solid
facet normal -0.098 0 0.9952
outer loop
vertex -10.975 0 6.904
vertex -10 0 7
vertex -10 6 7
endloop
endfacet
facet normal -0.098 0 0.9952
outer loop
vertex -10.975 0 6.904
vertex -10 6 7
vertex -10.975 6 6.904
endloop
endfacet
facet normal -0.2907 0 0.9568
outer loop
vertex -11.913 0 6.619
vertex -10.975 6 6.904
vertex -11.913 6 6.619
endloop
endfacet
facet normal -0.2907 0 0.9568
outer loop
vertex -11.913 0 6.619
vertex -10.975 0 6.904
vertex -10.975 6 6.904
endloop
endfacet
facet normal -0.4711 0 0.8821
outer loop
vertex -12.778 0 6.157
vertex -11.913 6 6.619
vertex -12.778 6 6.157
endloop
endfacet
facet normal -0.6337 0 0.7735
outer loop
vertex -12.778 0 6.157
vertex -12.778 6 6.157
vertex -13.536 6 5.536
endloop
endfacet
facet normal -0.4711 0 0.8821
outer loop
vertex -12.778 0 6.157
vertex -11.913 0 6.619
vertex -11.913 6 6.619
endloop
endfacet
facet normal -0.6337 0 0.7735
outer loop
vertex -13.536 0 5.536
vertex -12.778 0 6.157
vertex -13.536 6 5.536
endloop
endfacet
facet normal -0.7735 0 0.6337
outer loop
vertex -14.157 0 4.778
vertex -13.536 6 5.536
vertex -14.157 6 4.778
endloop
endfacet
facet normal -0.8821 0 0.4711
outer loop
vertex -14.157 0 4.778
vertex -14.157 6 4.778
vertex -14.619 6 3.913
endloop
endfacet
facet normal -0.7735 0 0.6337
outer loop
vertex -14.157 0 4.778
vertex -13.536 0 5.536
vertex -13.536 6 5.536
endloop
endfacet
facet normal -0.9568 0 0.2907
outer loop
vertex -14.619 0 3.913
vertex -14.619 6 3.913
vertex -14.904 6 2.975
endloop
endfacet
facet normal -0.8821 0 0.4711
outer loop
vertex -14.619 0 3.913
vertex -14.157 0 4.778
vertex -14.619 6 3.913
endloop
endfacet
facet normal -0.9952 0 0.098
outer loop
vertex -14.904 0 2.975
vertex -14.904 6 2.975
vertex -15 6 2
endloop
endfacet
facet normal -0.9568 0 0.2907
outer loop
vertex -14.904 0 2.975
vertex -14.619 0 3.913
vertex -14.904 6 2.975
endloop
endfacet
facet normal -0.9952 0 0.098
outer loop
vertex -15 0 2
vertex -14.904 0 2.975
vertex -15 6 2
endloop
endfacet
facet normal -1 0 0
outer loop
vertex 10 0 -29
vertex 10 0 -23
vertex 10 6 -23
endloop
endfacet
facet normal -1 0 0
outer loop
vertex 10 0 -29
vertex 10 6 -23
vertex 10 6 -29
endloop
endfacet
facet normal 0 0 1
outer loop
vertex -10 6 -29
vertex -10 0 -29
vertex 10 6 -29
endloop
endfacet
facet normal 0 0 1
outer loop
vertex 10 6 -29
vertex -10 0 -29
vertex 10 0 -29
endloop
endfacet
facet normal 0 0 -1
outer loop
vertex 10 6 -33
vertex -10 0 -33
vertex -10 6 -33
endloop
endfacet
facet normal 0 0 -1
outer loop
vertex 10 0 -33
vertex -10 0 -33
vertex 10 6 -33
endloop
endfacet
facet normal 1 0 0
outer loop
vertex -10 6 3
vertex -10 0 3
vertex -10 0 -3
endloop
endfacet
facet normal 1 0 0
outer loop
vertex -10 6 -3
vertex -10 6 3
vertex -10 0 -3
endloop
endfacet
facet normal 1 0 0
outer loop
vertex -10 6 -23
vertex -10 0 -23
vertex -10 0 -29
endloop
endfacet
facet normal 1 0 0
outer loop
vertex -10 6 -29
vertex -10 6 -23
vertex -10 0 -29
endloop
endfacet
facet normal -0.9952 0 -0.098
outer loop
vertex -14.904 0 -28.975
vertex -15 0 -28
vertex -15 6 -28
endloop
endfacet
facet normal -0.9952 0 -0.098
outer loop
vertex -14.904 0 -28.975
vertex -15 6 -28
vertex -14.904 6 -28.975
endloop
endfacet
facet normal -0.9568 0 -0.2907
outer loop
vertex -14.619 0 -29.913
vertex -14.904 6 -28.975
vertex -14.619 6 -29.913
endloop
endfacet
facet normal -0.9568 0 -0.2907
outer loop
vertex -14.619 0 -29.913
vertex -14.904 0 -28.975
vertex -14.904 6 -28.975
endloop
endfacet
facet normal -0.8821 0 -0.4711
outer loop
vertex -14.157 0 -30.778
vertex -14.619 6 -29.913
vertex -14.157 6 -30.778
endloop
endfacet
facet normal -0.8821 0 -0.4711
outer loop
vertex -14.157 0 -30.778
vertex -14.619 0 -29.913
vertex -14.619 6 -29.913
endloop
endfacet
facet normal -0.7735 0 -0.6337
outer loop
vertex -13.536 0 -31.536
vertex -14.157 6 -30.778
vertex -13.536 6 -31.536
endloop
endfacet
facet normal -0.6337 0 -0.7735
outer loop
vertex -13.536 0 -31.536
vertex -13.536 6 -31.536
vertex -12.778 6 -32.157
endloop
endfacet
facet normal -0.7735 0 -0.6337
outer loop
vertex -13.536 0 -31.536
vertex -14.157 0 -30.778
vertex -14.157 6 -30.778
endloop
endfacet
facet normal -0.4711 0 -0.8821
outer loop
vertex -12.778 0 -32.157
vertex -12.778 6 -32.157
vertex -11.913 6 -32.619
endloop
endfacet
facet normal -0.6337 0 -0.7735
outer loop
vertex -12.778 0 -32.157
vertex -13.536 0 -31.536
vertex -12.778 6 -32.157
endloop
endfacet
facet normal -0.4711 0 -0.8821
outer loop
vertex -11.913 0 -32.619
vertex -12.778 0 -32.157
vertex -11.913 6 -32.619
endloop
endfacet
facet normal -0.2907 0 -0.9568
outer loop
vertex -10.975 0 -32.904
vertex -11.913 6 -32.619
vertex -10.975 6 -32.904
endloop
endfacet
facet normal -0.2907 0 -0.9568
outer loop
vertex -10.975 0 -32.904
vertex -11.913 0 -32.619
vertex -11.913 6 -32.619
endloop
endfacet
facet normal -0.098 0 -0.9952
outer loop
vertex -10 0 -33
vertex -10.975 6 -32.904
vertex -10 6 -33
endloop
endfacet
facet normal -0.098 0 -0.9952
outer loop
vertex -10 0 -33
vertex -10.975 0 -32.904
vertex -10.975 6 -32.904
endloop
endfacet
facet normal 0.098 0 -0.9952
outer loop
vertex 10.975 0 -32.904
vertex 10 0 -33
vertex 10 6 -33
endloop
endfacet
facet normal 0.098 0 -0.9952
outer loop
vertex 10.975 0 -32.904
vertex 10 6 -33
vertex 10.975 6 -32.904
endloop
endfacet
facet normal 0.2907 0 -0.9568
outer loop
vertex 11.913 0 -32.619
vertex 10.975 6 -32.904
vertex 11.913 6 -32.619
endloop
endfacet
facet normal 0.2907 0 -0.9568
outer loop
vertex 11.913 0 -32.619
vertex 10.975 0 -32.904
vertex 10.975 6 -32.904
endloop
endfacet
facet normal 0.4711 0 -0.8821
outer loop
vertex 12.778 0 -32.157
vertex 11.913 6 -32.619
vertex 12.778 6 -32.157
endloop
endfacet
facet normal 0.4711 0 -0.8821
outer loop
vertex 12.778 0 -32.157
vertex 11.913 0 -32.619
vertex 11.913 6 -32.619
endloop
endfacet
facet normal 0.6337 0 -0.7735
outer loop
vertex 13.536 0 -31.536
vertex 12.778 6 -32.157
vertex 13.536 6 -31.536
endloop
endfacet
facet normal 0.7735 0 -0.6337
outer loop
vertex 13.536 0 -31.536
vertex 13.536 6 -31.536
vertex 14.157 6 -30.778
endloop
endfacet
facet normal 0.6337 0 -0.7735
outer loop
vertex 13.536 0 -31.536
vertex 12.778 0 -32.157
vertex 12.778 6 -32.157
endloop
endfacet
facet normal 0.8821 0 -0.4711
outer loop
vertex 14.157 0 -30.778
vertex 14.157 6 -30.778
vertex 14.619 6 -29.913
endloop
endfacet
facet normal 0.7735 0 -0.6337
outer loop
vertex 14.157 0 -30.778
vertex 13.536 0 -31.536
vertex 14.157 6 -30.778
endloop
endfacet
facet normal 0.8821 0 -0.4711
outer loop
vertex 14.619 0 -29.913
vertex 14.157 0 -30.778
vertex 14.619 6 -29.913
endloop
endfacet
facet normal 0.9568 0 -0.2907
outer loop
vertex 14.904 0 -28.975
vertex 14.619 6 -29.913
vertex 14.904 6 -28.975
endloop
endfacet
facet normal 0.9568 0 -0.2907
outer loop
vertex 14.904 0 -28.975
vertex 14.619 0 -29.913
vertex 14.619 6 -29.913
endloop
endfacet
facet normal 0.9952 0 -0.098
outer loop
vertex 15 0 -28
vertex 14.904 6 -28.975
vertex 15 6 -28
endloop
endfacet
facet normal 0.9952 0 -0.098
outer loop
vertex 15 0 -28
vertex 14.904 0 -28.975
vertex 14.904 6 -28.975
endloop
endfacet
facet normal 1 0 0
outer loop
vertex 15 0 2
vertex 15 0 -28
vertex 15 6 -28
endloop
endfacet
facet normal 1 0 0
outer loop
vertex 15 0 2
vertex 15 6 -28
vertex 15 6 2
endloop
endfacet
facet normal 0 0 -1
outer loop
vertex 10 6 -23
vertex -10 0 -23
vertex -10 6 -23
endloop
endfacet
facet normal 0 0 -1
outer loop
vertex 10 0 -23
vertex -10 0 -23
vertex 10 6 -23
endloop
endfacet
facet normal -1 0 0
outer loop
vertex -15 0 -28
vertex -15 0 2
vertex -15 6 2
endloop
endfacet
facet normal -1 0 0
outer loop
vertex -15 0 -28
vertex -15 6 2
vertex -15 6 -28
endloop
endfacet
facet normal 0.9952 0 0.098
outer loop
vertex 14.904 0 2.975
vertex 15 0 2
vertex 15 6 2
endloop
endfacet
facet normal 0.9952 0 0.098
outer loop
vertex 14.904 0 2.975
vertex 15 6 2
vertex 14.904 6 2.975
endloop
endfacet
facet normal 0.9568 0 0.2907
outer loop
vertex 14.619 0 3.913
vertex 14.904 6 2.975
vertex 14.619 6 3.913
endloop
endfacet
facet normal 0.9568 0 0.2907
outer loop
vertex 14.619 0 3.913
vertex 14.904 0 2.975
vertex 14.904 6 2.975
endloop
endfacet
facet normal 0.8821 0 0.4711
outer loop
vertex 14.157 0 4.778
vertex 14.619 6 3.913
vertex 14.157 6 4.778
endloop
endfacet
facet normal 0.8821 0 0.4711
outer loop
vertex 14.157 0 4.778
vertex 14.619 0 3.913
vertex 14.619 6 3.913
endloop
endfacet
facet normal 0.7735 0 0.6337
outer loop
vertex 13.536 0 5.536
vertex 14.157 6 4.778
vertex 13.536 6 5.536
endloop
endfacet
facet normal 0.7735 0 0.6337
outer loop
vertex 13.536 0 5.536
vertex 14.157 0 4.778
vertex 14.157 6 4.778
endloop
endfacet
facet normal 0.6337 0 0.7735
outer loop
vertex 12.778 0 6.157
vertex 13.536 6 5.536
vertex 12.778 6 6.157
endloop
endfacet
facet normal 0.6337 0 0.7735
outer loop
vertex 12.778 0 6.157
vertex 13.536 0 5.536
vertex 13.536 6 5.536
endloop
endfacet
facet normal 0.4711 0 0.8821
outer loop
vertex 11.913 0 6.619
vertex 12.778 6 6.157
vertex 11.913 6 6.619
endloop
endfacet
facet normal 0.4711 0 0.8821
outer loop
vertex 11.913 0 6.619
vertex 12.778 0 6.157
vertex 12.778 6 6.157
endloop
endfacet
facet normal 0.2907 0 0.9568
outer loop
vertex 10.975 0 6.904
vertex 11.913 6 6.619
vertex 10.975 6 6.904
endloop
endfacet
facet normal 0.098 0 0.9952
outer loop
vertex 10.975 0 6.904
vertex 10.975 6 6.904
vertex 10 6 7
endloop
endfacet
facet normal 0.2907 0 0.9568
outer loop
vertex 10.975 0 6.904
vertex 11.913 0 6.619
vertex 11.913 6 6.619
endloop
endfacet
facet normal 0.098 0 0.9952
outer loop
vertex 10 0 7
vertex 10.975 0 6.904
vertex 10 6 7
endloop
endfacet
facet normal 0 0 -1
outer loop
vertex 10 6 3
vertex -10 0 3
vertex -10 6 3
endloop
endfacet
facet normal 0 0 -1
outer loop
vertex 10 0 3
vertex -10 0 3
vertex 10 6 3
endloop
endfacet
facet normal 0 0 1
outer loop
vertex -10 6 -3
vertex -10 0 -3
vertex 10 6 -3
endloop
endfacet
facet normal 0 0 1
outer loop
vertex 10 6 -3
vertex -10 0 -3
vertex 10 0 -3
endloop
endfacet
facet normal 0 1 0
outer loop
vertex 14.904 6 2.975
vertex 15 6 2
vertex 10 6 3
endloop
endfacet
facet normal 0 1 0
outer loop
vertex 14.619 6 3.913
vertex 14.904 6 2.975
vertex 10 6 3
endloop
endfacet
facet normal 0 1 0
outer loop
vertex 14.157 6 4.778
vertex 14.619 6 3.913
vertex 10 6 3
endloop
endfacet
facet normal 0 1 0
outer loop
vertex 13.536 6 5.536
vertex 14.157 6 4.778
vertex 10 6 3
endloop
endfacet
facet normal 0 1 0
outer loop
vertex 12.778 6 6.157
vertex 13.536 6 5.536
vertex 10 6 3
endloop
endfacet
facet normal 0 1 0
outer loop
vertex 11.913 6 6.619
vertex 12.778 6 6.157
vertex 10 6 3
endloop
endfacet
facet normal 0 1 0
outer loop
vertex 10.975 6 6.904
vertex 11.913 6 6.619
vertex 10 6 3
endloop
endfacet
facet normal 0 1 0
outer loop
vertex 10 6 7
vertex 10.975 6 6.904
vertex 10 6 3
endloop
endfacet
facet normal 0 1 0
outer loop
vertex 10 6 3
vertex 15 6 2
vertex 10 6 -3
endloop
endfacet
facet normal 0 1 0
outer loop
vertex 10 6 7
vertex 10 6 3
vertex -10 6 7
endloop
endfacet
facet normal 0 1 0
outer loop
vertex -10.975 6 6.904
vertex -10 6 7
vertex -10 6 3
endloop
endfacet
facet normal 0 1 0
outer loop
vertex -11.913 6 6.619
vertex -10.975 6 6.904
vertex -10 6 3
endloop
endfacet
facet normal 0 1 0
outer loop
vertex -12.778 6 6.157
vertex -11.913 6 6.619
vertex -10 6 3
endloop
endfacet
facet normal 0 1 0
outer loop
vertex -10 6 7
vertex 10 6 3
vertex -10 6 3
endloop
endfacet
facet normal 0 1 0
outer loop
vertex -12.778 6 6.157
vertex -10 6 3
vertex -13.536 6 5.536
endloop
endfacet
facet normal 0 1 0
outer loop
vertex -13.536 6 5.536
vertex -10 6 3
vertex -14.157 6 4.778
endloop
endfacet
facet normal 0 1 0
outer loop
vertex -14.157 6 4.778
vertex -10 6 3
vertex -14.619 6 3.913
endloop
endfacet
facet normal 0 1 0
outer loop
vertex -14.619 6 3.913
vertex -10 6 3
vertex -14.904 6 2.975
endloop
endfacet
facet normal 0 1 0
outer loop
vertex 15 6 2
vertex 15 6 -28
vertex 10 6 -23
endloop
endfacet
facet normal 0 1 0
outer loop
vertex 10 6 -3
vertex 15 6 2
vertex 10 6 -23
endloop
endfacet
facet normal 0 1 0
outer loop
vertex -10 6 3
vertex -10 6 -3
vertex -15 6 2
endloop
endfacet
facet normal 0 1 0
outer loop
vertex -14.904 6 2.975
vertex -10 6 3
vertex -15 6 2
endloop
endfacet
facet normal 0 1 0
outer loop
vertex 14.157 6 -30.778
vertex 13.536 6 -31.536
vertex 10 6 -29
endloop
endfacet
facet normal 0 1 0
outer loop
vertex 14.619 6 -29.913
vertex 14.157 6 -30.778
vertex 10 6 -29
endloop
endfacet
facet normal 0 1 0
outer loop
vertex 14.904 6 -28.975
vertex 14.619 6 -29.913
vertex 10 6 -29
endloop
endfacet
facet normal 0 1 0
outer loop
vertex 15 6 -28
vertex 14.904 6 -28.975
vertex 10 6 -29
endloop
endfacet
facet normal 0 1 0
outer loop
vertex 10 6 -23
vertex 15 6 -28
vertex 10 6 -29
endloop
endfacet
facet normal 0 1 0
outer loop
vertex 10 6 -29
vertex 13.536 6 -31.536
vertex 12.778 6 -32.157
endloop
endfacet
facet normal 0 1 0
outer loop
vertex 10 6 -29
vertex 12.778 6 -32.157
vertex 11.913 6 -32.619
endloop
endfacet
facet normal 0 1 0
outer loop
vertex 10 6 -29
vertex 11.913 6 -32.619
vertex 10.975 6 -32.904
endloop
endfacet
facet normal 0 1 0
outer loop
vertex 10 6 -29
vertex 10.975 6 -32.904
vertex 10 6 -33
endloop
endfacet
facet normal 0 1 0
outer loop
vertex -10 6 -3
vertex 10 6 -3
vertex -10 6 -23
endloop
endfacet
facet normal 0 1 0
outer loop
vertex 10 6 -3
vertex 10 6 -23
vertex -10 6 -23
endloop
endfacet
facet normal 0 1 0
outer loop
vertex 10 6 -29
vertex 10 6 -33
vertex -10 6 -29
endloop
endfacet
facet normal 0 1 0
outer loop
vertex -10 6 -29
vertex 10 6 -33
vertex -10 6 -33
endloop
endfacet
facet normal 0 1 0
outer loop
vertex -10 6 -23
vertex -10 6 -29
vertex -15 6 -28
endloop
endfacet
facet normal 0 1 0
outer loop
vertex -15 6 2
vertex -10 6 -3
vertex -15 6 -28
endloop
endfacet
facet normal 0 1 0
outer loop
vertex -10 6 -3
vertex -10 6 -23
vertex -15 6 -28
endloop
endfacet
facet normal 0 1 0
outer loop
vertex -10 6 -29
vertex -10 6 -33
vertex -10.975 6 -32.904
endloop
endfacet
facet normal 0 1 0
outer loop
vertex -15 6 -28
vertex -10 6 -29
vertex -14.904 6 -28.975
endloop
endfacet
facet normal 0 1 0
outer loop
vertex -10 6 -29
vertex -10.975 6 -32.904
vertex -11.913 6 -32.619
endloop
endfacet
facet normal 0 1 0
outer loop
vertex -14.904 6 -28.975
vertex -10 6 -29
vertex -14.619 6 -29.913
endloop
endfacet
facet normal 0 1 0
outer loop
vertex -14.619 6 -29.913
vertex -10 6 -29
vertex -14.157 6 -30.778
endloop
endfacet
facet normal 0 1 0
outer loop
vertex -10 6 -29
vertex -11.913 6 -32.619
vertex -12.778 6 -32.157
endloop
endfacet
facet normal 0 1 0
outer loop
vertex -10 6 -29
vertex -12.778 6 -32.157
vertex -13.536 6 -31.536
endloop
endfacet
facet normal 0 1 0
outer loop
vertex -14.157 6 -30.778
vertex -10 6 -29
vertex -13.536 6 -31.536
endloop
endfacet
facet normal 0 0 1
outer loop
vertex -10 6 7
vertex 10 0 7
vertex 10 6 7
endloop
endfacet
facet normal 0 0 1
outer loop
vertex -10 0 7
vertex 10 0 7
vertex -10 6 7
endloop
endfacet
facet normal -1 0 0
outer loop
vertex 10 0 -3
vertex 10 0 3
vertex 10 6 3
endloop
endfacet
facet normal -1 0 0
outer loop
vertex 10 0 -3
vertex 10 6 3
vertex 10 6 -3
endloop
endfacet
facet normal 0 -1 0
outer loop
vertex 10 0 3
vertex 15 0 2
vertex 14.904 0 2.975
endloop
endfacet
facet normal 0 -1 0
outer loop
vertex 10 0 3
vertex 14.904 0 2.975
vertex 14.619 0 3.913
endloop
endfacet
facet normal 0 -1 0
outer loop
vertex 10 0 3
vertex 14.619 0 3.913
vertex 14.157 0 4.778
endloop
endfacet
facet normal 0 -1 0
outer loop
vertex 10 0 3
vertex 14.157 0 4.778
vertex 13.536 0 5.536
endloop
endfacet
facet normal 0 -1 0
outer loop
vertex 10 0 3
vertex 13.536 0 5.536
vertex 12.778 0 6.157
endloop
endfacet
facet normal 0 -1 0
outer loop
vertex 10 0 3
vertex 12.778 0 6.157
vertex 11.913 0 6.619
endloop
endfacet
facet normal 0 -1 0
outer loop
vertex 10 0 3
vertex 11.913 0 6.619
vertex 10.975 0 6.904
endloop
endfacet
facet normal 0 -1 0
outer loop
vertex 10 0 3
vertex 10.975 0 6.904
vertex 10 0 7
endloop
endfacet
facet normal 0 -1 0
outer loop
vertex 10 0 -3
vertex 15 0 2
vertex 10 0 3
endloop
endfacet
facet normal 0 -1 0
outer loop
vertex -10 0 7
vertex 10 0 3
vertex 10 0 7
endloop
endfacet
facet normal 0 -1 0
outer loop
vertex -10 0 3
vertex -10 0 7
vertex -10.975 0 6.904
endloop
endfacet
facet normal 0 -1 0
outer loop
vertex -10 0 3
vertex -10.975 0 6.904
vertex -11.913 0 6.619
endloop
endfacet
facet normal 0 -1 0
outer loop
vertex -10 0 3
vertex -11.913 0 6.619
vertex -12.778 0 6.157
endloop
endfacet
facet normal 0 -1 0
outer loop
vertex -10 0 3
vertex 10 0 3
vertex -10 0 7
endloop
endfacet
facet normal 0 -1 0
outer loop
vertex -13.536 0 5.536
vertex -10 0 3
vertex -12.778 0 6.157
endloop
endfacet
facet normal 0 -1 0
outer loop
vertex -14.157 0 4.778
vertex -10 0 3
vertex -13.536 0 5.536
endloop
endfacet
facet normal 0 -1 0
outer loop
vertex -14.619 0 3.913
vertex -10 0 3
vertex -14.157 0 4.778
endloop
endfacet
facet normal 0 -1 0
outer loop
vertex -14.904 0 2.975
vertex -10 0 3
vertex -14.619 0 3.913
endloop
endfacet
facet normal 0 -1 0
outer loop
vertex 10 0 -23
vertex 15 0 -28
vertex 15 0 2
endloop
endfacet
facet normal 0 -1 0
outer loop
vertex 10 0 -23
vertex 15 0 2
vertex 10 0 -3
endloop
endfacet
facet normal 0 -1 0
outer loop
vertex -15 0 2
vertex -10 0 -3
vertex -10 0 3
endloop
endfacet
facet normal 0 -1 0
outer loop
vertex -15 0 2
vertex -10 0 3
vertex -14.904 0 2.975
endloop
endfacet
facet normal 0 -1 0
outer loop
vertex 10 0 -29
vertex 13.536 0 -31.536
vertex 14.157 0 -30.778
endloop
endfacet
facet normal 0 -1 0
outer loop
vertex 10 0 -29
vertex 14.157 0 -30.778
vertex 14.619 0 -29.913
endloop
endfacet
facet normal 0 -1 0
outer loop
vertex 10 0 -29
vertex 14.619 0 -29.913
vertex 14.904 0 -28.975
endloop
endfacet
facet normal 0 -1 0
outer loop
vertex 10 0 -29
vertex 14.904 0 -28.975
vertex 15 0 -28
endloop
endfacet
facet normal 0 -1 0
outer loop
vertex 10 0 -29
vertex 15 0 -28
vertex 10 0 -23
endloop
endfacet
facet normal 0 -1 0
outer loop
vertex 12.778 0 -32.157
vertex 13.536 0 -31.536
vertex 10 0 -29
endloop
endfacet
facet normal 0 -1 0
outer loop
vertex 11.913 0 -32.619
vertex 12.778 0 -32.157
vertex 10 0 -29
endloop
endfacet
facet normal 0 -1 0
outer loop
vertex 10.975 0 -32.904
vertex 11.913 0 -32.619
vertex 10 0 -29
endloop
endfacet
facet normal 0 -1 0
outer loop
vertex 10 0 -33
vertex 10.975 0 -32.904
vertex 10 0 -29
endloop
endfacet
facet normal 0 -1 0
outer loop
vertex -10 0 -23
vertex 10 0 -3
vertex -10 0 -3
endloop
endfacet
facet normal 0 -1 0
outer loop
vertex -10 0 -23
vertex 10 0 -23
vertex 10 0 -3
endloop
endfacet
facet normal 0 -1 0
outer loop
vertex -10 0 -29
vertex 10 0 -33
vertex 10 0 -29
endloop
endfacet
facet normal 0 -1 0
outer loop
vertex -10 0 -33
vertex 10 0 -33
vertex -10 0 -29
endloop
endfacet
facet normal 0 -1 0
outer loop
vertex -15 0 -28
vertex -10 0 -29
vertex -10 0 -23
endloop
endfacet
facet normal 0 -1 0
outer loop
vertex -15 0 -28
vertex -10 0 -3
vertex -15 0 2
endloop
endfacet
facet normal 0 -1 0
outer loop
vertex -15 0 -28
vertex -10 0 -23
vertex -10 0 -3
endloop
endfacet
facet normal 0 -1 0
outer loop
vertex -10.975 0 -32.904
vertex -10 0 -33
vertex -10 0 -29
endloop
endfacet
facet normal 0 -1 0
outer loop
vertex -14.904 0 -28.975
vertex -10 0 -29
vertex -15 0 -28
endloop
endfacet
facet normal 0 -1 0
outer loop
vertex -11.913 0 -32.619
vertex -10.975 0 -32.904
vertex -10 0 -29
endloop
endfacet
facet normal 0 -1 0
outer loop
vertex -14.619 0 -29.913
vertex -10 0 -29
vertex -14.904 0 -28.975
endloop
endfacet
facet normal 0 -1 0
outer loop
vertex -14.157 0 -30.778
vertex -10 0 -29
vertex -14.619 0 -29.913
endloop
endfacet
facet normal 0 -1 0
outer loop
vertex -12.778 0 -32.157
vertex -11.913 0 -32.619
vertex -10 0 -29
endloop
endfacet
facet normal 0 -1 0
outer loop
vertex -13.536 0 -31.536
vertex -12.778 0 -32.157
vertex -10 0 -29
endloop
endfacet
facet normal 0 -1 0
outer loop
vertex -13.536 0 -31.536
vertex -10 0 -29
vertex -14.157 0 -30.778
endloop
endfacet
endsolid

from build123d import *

# Parameters (mm, degrees)
SKETCH1_W           = 20
SKETCH1_H           = 6
BOSS_EXTRUDE1_DEPTH = 6


with BuildPart() as part:
    # Sketch1 → Boss-Extrude1 (new body)
    with BuildSketch(Plane(origin=(0, 0, 0), x_dir=(1, 0, 0), z_dir=(0, 1, 0))):
        with BuildLine():
            Line((-10, 33), (10, 33))
            ThreePointArc((10, 33), (13.535533906, 31.535533906), (15, 28))
            Line((15, 28), (15, -2))
            ThreePointArc((15, -2), (13.535533906, -5.535533906), (10, -7))
            Line((10, -7), (-10, -7))
            ThreePointArc((-10, -7), (-13.535533906, -5.535533906), (-15, -2))
            Line((-15, -2), (-15, 28))
            ThreePointArc((-15, 28), (-13.535533906, 31.535533906), (-10, 33))
        make_face()
        with Locations((0, 26)):
            Rectangle(SKETCH1_W, SKETCH1_H, mode=Mode.SUBTRACT)
        Rectangle(SKETCH1_W, SKETCH1_H, mode=Mode.SUBTRACT)
    extrude(amount=BOSS_EXTRUDE1_DEPTH)


solid = part.part
